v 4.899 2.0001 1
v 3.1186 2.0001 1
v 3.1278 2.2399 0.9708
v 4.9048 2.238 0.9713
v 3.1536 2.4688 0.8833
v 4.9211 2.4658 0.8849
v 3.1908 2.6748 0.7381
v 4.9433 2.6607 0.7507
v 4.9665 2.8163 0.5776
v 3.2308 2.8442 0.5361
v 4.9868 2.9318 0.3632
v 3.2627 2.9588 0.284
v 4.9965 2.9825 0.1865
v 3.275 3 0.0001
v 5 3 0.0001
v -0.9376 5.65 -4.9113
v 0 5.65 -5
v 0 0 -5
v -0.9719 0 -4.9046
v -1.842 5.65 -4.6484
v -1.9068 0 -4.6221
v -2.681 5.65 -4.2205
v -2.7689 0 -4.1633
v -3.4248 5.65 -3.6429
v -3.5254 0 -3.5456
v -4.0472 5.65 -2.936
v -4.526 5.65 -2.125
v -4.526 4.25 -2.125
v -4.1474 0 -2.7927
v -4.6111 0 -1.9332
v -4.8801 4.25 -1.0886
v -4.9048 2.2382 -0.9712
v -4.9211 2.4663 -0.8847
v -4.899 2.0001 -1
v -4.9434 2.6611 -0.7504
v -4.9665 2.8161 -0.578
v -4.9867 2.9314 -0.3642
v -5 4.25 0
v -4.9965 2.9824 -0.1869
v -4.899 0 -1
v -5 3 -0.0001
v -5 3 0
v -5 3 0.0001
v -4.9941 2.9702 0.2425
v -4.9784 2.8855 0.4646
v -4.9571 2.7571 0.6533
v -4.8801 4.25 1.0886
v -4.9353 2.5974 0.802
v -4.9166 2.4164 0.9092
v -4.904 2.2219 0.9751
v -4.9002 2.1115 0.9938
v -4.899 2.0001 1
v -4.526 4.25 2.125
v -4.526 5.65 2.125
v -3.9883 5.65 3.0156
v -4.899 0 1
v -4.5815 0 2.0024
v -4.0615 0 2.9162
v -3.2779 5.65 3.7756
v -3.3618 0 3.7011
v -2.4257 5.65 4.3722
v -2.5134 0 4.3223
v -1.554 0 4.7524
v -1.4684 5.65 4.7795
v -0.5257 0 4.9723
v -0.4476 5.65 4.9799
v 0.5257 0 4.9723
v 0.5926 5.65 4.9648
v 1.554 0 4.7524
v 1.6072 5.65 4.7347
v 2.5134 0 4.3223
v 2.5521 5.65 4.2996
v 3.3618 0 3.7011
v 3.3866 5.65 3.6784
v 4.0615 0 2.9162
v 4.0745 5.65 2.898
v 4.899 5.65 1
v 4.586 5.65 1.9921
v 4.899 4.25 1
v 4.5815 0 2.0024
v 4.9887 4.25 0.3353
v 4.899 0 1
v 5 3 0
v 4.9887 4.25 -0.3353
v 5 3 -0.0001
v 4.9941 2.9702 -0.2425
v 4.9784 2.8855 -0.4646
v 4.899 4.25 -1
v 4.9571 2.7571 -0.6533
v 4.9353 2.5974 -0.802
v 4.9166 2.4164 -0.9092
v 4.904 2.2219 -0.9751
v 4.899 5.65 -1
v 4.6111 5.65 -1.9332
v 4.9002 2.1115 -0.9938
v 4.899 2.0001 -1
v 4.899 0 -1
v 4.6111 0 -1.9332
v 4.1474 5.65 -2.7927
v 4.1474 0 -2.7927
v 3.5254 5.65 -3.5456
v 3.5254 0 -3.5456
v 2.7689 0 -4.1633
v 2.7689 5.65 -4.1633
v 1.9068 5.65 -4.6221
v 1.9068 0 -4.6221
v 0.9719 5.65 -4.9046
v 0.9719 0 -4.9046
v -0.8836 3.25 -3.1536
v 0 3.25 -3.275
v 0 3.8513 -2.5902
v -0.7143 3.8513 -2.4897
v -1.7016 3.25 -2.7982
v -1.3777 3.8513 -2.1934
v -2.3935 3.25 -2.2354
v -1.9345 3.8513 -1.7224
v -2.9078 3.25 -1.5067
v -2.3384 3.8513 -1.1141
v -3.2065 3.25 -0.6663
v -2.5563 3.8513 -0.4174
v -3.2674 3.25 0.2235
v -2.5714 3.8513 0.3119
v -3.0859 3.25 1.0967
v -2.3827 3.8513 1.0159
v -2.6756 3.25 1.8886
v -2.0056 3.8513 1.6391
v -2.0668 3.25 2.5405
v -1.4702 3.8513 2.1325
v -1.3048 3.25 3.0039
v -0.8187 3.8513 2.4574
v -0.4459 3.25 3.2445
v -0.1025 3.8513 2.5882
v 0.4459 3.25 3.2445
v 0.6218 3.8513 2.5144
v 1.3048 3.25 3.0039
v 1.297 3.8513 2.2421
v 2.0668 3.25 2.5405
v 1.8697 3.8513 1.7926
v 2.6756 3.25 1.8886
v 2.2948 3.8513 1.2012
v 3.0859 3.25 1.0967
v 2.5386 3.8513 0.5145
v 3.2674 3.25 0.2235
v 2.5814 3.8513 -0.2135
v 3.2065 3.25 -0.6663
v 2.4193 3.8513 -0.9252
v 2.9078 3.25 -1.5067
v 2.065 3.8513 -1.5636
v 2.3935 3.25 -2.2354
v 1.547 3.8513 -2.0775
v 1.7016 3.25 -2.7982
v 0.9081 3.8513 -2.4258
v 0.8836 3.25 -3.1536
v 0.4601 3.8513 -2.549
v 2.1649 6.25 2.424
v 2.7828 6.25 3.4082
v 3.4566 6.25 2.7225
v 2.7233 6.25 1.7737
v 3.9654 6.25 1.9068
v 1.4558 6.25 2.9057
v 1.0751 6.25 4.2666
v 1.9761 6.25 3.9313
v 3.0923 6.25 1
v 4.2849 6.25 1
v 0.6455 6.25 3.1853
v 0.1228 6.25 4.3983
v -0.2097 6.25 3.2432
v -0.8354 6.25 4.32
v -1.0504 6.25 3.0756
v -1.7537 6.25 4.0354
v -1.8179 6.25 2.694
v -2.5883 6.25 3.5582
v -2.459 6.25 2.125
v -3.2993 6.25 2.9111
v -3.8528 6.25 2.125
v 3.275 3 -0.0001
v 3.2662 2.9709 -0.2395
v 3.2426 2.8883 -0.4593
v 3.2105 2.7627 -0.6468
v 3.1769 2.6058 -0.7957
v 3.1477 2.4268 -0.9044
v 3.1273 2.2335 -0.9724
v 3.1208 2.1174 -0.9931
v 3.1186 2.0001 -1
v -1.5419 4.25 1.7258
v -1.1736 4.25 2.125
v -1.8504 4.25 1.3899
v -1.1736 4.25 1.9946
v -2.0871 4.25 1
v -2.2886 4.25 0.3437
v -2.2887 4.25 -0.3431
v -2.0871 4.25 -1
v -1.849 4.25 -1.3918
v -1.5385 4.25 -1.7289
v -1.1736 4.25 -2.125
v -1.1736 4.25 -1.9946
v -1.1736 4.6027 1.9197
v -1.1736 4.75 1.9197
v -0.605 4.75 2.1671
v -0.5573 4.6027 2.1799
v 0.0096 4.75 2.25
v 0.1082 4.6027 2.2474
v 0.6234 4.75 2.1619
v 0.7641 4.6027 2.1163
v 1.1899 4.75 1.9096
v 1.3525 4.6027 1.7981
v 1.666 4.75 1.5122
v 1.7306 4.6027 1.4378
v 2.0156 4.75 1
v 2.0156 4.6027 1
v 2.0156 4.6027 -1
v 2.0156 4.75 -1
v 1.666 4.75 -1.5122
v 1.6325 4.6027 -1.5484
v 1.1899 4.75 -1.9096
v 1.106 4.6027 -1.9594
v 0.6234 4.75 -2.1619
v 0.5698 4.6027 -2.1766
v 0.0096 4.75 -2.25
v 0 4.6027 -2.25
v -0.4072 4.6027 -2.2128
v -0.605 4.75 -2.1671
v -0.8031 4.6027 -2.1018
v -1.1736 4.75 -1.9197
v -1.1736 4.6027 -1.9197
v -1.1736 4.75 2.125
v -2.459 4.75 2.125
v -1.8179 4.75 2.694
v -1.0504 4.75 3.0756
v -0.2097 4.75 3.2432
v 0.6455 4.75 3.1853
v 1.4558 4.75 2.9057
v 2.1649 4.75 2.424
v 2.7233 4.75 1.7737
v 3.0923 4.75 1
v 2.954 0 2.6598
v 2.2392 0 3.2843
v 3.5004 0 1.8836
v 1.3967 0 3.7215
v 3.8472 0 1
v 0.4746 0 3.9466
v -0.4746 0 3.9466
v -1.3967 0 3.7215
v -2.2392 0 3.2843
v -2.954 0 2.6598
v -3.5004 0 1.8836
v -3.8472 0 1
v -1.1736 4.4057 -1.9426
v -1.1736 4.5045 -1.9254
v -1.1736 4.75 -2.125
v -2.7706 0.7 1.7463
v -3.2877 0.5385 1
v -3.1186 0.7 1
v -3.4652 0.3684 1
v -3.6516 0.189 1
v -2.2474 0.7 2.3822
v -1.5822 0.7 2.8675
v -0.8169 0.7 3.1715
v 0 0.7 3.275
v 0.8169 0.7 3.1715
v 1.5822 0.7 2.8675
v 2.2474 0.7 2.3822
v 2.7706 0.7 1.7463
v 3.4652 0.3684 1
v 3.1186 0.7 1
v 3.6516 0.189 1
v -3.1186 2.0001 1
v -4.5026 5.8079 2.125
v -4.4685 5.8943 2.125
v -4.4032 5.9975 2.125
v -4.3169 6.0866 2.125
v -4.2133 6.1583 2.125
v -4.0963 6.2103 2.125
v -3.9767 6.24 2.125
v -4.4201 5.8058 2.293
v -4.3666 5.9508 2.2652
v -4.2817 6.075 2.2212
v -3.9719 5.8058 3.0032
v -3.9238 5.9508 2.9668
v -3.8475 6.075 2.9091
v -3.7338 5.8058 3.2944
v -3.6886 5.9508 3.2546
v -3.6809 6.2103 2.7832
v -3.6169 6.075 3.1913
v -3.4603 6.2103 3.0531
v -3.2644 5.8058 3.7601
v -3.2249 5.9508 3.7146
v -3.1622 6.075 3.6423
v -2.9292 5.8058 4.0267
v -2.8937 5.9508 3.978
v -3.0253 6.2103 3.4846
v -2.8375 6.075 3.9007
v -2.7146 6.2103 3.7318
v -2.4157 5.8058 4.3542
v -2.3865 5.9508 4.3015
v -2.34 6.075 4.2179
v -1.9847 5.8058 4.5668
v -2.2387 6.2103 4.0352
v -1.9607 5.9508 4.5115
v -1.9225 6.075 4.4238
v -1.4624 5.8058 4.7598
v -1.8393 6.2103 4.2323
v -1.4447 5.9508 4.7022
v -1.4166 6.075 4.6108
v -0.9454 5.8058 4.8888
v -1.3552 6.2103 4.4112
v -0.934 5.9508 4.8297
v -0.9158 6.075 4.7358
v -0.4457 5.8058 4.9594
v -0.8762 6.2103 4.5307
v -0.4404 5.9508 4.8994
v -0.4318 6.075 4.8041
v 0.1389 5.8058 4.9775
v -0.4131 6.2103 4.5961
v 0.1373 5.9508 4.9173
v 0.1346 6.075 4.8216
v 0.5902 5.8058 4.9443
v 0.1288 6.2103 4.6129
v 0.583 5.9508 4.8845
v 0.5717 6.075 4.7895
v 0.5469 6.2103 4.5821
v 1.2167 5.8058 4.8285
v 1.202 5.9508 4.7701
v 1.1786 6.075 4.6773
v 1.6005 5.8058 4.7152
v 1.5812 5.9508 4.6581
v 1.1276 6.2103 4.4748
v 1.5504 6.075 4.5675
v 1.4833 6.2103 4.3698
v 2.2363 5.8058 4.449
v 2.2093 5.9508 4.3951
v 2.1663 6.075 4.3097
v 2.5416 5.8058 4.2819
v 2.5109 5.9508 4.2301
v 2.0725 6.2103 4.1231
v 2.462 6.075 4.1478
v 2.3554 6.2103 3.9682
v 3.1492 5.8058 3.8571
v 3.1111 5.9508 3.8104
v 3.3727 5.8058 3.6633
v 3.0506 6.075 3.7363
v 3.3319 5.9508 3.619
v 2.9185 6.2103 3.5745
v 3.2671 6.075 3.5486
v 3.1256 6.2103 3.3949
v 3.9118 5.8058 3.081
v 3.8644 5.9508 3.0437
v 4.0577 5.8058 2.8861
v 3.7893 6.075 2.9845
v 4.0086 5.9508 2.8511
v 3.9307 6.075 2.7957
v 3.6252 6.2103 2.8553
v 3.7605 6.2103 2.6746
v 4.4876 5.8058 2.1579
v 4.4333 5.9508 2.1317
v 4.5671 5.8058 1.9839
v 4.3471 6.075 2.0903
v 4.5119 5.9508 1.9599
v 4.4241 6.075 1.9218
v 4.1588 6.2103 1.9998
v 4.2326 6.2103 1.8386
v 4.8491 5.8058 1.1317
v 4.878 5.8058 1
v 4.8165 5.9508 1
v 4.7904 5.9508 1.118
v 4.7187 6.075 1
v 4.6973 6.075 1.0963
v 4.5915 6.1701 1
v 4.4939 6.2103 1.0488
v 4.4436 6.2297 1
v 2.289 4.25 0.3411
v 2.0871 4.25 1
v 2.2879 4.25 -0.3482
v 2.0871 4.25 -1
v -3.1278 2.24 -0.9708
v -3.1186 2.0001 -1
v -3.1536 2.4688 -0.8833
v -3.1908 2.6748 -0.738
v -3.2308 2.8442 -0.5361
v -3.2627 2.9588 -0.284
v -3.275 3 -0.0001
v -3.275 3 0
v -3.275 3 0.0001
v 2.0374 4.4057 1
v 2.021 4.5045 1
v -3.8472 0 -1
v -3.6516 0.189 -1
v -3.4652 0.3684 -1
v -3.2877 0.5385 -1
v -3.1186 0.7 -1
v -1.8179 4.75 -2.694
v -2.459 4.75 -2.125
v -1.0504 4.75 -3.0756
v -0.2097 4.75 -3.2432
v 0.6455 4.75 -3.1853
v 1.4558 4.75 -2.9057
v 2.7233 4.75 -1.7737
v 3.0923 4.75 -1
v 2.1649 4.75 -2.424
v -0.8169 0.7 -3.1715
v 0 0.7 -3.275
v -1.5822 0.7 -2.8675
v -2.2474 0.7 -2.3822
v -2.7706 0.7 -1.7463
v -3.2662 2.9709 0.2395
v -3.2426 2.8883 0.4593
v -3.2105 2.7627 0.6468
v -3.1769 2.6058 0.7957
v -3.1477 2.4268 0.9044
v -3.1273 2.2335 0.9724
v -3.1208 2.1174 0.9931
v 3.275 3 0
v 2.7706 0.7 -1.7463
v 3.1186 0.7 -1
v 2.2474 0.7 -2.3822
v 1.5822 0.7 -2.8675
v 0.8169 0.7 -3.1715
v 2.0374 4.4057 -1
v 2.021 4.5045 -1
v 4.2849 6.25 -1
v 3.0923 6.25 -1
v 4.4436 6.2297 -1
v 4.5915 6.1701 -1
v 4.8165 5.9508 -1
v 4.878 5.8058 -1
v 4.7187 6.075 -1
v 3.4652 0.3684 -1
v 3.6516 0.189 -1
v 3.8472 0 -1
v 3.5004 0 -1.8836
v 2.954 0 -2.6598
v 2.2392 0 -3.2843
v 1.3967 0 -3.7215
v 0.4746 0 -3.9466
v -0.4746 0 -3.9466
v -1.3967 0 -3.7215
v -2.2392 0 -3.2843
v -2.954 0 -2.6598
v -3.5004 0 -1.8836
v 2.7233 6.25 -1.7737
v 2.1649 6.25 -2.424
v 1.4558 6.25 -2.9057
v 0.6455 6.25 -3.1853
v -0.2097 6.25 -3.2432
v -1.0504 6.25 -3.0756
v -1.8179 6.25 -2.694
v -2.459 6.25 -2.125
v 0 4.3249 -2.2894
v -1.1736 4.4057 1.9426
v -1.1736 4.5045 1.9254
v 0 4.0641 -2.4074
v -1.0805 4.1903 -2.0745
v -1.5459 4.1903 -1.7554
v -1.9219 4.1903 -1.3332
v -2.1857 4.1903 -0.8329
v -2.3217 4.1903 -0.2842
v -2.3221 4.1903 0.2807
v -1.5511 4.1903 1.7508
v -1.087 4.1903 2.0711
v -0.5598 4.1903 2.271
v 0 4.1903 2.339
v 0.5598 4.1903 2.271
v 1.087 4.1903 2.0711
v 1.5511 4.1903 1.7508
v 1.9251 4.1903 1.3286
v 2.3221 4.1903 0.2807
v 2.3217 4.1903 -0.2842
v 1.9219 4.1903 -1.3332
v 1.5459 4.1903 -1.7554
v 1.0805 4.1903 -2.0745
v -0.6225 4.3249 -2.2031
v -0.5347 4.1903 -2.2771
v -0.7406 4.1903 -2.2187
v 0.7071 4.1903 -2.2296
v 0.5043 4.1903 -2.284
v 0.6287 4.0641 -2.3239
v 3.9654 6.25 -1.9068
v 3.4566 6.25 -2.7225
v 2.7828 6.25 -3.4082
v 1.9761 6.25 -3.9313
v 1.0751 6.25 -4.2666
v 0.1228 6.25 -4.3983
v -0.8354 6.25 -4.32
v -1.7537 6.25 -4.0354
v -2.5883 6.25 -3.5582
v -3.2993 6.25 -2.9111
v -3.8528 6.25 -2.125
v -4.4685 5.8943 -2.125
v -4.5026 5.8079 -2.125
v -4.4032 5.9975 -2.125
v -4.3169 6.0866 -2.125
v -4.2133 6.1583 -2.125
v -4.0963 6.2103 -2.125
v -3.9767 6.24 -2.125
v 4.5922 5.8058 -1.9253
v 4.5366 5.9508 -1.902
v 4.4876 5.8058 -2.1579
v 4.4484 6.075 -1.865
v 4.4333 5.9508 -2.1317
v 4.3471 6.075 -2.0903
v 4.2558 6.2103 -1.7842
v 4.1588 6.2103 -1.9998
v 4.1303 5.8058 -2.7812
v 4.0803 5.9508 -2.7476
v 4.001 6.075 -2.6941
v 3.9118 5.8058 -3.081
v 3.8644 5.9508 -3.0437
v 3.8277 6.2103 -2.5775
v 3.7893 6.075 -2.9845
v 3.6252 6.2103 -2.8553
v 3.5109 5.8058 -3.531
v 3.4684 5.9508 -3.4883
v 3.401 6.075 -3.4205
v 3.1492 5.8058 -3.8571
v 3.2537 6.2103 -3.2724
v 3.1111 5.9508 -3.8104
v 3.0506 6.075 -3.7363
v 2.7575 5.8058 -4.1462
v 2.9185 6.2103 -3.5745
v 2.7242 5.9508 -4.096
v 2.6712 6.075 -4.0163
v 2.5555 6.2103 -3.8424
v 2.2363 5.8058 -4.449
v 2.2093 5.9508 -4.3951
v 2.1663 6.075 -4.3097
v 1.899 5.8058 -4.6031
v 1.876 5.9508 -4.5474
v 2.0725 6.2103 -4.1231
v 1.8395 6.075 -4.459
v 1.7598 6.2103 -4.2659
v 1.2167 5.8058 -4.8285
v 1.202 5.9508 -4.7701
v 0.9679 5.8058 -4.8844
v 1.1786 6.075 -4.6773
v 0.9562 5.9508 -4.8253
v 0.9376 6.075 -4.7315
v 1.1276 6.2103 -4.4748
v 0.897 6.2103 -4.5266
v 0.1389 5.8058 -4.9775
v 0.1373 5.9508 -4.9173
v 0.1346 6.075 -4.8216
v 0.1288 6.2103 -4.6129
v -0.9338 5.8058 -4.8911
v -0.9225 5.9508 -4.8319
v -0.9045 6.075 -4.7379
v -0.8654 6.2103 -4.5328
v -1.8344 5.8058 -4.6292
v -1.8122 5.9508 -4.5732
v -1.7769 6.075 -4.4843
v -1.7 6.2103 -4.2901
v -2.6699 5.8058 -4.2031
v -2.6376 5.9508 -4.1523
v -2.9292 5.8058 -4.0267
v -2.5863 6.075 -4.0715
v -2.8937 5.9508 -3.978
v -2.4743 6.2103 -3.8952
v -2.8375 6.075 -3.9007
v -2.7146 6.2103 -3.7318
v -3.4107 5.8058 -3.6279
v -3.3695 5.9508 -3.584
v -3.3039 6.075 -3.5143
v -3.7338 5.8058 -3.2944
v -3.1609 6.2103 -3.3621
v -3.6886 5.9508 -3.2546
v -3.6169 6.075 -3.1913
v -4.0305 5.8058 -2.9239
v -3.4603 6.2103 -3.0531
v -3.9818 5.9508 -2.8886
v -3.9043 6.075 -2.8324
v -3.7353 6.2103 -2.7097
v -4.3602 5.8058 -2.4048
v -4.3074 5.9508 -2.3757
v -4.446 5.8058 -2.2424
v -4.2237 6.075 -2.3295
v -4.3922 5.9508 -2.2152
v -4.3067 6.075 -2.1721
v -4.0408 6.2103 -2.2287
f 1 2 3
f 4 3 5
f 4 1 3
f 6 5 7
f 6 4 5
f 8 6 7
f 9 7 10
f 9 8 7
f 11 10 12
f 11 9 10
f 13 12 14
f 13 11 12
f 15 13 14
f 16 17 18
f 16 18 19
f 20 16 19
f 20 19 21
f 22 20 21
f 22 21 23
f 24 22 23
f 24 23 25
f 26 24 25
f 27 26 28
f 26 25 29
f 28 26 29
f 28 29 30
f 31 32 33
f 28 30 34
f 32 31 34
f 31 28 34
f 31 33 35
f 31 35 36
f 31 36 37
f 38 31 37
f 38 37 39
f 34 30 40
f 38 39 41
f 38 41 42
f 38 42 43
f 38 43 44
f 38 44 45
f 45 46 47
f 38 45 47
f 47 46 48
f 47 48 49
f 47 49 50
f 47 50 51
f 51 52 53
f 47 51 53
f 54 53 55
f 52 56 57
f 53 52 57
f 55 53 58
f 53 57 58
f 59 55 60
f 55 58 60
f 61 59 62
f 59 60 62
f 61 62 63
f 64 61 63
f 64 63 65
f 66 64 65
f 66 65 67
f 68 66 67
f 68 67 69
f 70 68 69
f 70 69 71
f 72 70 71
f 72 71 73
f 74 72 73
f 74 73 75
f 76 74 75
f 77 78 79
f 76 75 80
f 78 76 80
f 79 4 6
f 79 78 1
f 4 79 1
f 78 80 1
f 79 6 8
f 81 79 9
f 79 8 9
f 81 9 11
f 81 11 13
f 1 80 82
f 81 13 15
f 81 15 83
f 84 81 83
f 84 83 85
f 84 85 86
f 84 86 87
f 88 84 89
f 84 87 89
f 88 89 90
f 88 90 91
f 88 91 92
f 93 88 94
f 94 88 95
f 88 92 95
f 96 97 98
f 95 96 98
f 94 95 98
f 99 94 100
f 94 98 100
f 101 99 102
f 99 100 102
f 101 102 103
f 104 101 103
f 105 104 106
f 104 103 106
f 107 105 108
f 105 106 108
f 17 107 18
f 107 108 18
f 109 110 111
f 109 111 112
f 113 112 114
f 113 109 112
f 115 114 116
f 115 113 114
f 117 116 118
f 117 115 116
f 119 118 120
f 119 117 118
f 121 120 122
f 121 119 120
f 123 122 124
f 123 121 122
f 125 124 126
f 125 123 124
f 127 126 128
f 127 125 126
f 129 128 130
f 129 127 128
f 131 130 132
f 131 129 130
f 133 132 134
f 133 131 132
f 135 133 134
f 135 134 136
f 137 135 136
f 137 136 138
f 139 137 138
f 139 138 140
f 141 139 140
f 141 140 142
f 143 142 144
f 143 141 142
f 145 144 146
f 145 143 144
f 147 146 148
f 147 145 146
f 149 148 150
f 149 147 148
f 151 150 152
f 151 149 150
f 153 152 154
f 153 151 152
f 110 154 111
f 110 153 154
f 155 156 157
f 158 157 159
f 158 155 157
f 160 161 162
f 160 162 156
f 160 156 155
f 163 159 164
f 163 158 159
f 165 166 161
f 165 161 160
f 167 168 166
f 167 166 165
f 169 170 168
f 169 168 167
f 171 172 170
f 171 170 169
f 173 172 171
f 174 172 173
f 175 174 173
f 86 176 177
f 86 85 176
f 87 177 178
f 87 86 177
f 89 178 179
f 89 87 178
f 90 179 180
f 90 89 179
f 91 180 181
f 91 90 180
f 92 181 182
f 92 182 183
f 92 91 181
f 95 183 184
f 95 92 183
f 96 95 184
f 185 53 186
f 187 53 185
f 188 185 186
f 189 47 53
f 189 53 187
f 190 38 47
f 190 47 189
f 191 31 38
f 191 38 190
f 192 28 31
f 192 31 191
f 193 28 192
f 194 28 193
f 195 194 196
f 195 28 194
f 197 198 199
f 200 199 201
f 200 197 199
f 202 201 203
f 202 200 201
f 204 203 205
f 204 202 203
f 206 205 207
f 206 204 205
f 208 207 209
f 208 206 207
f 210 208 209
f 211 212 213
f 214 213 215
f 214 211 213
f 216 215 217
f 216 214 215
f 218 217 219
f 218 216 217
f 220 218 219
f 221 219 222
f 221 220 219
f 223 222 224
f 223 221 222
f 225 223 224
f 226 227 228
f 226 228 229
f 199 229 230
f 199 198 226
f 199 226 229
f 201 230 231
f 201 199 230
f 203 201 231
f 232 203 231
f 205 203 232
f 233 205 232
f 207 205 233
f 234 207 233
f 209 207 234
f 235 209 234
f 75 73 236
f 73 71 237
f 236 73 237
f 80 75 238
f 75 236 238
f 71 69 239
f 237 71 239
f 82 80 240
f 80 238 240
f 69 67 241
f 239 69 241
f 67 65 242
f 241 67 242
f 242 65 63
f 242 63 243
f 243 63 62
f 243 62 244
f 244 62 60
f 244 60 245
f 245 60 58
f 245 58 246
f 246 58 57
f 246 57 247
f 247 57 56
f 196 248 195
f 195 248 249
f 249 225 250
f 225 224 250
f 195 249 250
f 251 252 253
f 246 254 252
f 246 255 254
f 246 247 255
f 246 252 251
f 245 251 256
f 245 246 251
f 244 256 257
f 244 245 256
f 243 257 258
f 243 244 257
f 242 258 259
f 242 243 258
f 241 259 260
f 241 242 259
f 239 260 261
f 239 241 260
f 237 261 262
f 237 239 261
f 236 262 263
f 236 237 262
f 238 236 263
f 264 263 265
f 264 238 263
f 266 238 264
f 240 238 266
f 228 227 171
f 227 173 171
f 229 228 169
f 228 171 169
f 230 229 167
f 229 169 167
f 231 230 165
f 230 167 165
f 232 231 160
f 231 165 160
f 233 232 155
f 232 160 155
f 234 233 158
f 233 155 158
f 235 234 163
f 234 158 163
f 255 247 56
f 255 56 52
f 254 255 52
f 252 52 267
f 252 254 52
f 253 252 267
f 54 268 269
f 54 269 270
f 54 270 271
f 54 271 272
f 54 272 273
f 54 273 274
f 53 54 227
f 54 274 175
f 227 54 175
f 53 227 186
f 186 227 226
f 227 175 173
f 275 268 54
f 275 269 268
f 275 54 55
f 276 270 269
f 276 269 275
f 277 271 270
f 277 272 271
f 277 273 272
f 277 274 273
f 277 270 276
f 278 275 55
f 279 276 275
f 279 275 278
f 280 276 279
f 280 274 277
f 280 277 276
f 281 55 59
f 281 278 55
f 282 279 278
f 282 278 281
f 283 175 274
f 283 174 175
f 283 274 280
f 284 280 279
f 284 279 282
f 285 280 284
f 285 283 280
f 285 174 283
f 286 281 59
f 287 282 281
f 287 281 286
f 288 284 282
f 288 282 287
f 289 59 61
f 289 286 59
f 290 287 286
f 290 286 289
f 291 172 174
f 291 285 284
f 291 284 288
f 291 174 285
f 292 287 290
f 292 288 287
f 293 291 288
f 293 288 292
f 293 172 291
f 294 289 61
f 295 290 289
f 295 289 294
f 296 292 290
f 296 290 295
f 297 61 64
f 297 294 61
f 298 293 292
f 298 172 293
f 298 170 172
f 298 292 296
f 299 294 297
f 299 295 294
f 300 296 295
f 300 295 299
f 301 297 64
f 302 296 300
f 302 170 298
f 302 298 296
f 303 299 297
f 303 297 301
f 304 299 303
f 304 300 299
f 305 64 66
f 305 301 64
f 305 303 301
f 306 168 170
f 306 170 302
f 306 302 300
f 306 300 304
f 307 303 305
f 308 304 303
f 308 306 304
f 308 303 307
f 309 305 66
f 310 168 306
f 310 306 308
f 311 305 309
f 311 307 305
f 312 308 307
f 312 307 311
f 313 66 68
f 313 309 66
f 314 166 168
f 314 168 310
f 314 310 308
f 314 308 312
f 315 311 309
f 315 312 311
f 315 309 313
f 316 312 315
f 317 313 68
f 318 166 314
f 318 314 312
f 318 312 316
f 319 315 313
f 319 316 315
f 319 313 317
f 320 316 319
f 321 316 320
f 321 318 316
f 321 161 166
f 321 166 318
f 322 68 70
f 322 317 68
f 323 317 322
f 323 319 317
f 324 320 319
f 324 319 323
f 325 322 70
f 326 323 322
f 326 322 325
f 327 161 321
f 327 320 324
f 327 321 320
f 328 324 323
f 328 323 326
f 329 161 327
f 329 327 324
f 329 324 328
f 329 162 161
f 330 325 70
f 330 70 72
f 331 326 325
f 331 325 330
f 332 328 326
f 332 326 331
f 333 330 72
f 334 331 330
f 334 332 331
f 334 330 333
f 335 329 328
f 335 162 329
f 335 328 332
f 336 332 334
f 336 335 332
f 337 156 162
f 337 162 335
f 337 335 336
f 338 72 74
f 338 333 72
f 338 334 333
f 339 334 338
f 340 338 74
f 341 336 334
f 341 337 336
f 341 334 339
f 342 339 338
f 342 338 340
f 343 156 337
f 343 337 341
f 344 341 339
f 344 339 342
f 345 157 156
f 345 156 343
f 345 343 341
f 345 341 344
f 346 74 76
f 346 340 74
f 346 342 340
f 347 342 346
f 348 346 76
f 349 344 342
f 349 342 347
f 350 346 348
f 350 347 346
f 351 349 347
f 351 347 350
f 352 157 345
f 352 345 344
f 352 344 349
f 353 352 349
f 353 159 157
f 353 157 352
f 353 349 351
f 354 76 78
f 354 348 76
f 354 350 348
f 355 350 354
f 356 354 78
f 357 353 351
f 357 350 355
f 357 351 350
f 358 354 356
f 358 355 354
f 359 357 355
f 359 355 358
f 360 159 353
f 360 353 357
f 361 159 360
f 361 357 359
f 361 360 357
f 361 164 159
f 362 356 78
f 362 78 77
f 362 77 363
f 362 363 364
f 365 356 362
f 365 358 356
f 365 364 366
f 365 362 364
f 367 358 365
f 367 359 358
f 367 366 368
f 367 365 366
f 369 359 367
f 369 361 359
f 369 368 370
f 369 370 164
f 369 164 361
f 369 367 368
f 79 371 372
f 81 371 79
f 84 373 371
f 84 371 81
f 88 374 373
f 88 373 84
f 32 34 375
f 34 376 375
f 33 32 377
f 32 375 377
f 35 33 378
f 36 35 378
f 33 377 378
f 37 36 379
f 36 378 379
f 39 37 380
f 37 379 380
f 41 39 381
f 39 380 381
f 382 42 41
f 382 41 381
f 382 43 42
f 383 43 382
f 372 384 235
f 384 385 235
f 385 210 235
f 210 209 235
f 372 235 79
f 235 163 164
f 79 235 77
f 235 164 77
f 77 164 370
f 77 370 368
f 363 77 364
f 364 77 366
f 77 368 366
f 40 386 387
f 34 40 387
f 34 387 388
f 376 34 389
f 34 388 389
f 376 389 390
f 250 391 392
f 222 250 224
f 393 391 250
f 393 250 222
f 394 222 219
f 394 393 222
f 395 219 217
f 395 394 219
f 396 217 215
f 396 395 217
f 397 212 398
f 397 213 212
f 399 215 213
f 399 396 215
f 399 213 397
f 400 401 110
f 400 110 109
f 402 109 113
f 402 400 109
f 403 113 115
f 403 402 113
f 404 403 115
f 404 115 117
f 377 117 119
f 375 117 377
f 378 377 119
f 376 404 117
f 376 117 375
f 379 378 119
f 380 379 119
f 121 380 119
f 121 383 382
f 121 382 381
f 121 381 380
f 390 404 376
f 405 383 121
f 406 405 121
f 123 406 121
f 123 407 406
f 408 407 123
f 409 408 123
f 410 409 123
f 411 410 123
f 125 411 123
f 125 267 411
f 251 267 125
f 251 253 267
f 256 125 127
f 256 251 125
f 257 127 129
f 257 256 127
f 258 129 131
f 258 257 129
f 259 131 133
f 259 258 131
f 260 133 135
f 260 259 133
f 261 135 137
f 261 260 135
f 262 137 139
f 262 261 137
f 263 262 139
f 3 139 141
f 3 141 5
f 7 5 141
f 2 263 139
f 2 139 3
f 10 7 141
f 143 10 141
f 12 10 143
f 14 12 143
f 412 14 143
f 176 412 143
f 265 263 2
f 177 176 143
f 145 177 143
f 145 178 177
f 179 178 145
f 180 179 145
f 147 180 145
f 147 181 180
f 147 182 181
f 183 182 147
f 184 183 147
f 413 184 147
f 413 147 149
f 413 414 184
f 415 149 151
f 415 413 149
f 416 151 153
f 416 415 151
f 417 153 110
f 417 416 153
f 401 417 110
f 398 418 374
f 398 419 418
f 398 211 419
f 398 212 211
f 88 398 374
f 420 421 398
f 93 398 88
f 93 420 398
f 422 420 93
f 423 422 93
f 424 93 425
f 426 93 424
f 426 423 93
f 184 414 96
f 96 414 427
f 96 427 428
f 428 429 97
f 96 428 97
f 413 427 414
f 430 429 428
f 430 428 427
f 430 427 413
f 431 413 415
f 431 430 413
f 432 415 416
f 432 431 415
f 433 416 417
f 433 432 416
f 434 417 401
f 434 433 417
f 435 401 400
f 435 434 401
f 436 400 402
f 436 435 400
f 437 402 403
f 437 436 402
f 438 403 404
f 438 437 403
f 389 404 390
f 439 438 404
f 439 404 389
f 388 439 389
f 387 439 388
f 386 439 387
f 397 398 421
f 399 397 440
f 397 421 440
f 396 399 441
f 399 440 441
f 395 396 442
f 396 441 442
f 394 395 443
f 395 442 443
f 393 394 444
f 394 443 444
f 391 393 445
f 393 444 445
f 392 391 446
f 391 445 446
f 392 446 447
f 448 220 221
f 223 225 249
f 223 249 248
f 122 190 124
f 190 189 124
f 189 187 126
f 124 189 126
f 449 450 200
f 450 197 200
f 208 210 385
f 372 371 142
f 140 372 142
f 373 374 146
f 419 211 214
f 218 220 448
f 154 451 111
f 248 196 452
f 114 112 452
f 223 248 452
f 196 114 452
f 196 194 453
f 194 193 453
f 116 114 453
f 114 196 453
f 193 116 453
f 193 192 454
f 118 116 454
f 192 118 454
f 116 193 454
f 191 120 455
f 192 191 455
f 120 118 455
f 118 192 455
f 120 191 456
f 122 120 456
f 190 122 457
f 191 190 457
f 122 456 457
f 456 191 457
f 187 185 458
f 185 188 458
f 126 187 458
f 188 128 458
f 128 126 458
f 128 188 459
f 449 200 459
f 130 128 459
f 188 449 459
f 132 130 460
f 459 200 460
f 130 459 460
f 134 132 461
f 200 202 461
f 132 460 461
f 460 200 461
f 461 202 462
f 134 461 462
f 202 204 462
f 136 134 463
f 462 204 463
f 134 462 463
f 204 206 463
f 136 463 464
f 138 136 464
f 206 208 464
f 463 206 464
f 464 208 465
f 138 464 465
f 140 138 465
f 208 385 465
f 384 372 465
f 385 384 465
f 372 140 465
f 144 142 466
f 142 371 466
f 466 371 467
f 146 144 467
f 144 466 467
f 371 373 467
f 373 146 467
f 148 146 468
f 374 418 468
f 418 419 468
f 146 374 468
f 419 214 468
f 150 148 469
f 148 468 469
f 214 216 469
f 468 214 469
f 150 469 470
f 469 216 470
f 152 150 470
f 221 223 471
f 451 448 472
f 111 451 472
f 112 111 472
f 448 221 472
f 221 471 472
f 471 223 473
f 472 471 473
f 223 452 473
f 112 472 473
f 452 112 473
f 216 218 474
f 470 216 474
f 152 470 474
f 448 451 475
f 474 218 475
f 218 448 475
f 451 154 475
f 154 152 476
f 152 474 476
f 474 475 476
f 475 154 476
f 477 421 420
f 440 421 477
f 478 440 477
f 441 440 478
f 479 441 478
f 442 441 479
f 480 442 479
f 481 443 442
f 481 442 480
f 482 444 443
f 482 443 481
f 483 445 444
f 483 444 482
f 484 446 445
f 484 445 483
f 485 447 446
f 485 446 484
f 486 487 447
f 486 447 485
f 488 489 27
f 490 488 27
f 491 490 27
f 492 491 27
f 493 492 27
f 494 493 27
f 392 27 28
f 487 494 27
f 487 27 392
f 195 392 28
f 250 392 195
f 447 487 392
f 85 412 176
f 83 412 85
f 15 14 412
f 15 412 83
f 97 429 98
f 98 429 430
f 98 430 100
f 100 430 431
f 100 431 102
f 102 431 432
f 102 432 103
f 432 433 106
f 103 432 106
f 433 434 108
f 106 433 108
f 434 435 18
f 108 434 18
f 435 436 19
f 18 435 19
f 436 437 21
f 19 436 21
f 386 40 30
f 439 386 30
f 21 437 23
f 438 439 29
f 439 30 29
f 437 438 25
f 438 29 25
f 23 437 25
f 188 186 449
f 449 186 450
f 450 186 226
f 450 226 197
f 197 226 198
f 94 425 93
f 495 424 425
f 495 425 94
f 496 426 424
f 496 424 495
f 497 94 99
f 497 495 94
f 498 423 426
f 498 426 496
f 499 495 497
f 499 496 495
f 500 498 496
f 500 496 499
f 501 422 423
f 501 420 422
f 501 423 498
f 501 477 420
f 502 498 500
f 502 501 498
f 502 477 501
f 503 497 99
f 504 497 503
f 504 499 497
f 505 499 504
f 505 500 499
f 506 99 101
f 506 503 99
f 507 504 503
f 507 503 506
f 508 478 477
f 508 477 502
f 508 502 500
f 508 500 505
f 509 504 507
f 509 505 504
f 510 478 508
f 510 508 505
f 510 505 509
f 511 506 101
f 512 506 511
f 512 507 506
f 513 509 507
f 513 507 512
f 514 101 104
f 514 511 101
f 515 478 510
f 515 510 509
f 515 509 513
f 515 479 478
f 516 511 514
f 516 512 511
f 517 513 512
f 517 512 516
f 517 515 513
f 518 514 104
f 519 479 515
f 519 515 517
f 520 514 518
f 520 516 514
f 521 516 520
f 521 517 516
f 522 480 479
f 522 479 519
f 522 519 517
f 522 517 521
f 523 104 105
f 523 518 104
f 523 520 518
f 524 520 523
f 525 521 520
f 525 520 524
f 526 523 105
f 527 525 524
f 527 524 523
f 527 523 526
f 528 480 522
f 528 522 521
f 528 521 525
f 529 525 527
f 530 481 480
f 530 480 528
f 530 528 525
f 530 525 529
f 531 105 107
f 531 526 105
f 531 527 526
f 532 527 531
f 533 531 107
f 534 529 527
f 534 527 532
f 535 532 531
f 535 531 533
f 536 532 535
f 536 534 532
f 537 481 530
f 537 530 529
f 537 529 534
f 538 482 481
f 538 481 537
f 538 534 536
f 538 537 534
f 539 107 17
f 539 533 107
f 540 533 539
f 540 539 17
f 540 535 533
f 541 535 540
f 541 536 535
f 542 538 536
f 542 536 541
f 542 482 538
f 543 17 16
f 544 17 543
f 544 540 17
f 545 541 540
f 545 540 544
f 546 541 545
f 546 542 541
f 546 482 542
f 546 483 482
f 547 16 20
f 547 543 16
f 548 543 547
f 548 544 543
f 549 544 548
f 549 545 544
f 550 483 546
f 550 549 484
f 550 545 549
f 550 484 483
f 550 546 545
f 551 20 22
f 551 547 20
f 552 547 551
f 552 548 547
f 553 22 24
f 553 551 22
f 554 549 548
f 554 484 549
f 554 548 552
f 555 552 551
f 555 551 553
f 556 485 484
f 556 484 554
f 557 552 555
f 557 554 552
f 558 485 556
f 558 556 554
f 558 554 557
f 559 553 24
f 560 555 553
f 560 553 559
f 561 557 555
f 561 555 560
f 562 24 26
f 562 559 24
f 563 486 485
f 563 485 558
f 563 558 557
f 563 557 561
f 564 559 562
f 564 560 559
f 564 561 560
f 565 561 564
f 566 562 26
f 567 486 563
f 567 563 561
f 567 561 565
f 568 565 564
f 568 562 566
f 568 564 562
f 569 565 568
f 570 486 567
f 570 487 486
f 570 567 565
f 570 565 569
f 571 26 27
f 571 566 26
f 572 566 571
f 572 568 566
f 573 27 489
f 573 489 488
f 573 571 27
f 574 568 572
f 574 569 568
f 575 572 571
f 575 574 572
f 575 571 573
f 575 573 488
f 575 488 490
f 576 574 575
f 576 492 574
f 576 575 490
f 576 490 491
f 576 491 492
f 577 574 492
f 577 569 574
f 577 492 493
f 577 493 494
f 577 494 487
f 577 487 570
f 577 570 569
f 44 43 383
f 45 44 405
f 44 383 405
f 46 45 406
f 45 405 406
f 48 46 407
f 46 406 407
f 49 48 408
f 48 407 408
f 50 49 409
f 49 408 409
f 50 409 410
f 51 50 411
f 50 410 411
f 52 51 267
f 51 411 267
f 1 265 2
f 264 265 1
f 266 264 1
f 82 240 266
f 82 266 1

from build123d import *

# Parameters (mm, degrees)
CROQUIS1_R              = 5
CROQUIS1_R_2            = 3.275
SALIENTE_EXTRUIR1_DEPTH = 3.25
CROQUIS3_R              = 5
CROQUIS3_R_2            = 2.25
SALIENTE_EXTRUIR2_DEPTH = 2
REDONDEO1_R             = 0.6
REDONDEO2_R             = 1
CHAFL_N1_SIZE           = 0.7
CHAFL_N2_SIZE           = 0.5
SKETCH1_W               = 13.933828458
SKETCH1_H               = 2
CUT_EXTRUDE1_DEPTH      = 2
SKETCH2_R               = 3.25
CUT_EXTRUDE2_DEPTH      = 1.5
SKETCH3_W               = 17.261868402
SKETCH3_H               = 2
CUT_EXTRUDE3_DEPTH      = 3
CUT_EXTRUDE4_REACH      = 11.437
SKETCH4_W               = 4.736283822
SKETCH4_H               = 4.25
FILLET1_R               = 1


with BuildPart() as part:
    # Croquis1 → Saliente-Extruir1 (new body)
    with BuildSketch(Plane(origin=(0, 0, 0), x_dir=(1, 0, 0), z_dir=(0, 1, 0))):
        with Locations(Location((0, 0, 0), (0, 0, 90))):
            Circle(CROQUIS1_R)
        with Locations(Location((0, 0, 0), (0, 0, 90))):
            Circle(CROQUIS1_R_2, mode=Mode.SUBTRACT)
    extrude(amount=SALIENTE_EXTRUIR1_DEPTH)

    # Croquis2 → Revolución1 (revolve)
    with BuildSketch(Plane.XY, mode=Mode.PRIVATE) as revoluci_n1_sk:
        Polygon((-5, 3.25), (-5, 4.25), (-2.25, 4.25), (-2.25, 4.15), (-3.275, 3.25), align=None)
    revolve(revoluci_n1_sk.sketch.rotate(Axis((0, 0, 0), (0, 1, 0)), 270), axis=Axis((0, 0, 0), (0, 1, 0)))

    # Croquis3 → Saliente-Extruir2 (add)
    with BuildSketch(Plane(origin=(0, 4.25, 0), x_dir=(1, 0, 0), z_dir=(0, 1, 0))):
        with Locations(Location((0, 0, 0), (0, 0, 90))):
            Circle(CROQUIS3_R)
        with Locations(Location((0, 0, 0), (0, 0, 90))):
            Circle(CROQUIS3_R_2, mode=Mode.SUBTRACT)
    extrude(amount=SALIENTE_EXTRUIR2_DEPTH)

    # Redondeo1
    redondeo1_edges = [part.edges().sort_by_distance(p)[0] for p in [
        (0, 6.25, 5),
    ]]
    fillet(redondeo1_edges, radius=REDONDEO1_R)

    # Redondeo2
    redondeo2_edges = [part.edges().sort_by_distance(p)[0] for p in [
        (0, 4.15, 2.25),
    ]]
    fillet(redondeo2_edges, radius=REDONDEO2_R)

    # Chaflán1
    chafl_n1_edges = [part.edges().sort_by_distance(p)[0] for p in [
        (0, 0, 3.275),
    ]]
    chamfer(chafl_n1_edges, length=CHAFL_N1_SIZE)

    # Chaflán2
    chafl_n2_edges = [part.edges().sort_by_distance(p)[0] for p in [
        (0, 6.25, 2.25),
    ]]
    chamfer(chafl_n2_edges, length=CHAFL_N2_SIZE)

    # Sketch1 → Cut-Extrude1 (cut)
    with BuildSketch(Plane(origin=(0, 6.25, 0), x_dir=(1, 0, 0), z_dir=(0, 1, 0))):
        Rectangle(SKETCH1_W, SKETCH1_H)
    extrude(amount=-CUT_EXTRUDE1_DEPTH, mode=Mode.SUBTRACT)

    # Sketch2 → Cut-Extrude2 (cut)
    with BuildSketch(Plane(origin=(0, 6.25, 0), x_dir=(1, 0, 0), z_dir=(0, 1, 0))):
        Circle(SKETCH2_R)
    extrude(amount=-CUT_EXTRUDE2_DEPTH, mode=Mode.SUBTRACT)

    # Sketch3 → Cut-Extrude3 (cut)
    with BuildSketch(Plane.XZ):
        Rectangle(SKETCH3_W, SKETCH3_H)
    extrude(amount=-CUT_EXTRUDE3_DEPTH, mode=Mode.SUBTRACT)

    # Cut-Extrude4: up to this face of the body (flat: up to its plane)
    cut_extrude4_end = Plane(part.part.faces().sort_by_distance((3.602612573, 4.25, -9.08e-07))[0])
    # Sketch4 → Cut-Extrude4 (cut, up to the picked face)
    with BuildSketch(Plane(origin=(0, 6.25, 0), x_dir=(1, 0, 0), z_dir=(0, 1, 0)), mode=Mode.PRIVATE) as cut_extrude4_sk1:
        with Locations((-3.541734363, 0)):
            Rectangle(SKETCH4_W, SKETCH4_H)
    cut_extrude4_tool1 = split(extrude(cut_extrude4_sk1.sketch, amount=-CUT_EXTRUDE4_REACH, mode=Mode.PRIVATE), bisect_by=cut_extrude4_end, keep=Keep.BOTH, mode=Mode.PRIVATE)
    add(cut_extrude4_tool1.solids().sort_by(Axis((-3.541734, 6.25, 0), (0, -1, 0)))[0], mode=Mode.SUBTRACT)

    # Fillet1
    fillet1_edges = [part.edges().sort_by_distance(p)[0] for p in [
        (4.008786459, 3, -1),
        (-4.008786459, 3, -1),
        (4.008786459, 3, 1),
        (-4.008786459, 3, 1),
    ]]
    fillet(fillet1_edges, radius=FILLET1_R - 0.0001)  # a hair under: the kernel refuses the full size


solid = part.part
